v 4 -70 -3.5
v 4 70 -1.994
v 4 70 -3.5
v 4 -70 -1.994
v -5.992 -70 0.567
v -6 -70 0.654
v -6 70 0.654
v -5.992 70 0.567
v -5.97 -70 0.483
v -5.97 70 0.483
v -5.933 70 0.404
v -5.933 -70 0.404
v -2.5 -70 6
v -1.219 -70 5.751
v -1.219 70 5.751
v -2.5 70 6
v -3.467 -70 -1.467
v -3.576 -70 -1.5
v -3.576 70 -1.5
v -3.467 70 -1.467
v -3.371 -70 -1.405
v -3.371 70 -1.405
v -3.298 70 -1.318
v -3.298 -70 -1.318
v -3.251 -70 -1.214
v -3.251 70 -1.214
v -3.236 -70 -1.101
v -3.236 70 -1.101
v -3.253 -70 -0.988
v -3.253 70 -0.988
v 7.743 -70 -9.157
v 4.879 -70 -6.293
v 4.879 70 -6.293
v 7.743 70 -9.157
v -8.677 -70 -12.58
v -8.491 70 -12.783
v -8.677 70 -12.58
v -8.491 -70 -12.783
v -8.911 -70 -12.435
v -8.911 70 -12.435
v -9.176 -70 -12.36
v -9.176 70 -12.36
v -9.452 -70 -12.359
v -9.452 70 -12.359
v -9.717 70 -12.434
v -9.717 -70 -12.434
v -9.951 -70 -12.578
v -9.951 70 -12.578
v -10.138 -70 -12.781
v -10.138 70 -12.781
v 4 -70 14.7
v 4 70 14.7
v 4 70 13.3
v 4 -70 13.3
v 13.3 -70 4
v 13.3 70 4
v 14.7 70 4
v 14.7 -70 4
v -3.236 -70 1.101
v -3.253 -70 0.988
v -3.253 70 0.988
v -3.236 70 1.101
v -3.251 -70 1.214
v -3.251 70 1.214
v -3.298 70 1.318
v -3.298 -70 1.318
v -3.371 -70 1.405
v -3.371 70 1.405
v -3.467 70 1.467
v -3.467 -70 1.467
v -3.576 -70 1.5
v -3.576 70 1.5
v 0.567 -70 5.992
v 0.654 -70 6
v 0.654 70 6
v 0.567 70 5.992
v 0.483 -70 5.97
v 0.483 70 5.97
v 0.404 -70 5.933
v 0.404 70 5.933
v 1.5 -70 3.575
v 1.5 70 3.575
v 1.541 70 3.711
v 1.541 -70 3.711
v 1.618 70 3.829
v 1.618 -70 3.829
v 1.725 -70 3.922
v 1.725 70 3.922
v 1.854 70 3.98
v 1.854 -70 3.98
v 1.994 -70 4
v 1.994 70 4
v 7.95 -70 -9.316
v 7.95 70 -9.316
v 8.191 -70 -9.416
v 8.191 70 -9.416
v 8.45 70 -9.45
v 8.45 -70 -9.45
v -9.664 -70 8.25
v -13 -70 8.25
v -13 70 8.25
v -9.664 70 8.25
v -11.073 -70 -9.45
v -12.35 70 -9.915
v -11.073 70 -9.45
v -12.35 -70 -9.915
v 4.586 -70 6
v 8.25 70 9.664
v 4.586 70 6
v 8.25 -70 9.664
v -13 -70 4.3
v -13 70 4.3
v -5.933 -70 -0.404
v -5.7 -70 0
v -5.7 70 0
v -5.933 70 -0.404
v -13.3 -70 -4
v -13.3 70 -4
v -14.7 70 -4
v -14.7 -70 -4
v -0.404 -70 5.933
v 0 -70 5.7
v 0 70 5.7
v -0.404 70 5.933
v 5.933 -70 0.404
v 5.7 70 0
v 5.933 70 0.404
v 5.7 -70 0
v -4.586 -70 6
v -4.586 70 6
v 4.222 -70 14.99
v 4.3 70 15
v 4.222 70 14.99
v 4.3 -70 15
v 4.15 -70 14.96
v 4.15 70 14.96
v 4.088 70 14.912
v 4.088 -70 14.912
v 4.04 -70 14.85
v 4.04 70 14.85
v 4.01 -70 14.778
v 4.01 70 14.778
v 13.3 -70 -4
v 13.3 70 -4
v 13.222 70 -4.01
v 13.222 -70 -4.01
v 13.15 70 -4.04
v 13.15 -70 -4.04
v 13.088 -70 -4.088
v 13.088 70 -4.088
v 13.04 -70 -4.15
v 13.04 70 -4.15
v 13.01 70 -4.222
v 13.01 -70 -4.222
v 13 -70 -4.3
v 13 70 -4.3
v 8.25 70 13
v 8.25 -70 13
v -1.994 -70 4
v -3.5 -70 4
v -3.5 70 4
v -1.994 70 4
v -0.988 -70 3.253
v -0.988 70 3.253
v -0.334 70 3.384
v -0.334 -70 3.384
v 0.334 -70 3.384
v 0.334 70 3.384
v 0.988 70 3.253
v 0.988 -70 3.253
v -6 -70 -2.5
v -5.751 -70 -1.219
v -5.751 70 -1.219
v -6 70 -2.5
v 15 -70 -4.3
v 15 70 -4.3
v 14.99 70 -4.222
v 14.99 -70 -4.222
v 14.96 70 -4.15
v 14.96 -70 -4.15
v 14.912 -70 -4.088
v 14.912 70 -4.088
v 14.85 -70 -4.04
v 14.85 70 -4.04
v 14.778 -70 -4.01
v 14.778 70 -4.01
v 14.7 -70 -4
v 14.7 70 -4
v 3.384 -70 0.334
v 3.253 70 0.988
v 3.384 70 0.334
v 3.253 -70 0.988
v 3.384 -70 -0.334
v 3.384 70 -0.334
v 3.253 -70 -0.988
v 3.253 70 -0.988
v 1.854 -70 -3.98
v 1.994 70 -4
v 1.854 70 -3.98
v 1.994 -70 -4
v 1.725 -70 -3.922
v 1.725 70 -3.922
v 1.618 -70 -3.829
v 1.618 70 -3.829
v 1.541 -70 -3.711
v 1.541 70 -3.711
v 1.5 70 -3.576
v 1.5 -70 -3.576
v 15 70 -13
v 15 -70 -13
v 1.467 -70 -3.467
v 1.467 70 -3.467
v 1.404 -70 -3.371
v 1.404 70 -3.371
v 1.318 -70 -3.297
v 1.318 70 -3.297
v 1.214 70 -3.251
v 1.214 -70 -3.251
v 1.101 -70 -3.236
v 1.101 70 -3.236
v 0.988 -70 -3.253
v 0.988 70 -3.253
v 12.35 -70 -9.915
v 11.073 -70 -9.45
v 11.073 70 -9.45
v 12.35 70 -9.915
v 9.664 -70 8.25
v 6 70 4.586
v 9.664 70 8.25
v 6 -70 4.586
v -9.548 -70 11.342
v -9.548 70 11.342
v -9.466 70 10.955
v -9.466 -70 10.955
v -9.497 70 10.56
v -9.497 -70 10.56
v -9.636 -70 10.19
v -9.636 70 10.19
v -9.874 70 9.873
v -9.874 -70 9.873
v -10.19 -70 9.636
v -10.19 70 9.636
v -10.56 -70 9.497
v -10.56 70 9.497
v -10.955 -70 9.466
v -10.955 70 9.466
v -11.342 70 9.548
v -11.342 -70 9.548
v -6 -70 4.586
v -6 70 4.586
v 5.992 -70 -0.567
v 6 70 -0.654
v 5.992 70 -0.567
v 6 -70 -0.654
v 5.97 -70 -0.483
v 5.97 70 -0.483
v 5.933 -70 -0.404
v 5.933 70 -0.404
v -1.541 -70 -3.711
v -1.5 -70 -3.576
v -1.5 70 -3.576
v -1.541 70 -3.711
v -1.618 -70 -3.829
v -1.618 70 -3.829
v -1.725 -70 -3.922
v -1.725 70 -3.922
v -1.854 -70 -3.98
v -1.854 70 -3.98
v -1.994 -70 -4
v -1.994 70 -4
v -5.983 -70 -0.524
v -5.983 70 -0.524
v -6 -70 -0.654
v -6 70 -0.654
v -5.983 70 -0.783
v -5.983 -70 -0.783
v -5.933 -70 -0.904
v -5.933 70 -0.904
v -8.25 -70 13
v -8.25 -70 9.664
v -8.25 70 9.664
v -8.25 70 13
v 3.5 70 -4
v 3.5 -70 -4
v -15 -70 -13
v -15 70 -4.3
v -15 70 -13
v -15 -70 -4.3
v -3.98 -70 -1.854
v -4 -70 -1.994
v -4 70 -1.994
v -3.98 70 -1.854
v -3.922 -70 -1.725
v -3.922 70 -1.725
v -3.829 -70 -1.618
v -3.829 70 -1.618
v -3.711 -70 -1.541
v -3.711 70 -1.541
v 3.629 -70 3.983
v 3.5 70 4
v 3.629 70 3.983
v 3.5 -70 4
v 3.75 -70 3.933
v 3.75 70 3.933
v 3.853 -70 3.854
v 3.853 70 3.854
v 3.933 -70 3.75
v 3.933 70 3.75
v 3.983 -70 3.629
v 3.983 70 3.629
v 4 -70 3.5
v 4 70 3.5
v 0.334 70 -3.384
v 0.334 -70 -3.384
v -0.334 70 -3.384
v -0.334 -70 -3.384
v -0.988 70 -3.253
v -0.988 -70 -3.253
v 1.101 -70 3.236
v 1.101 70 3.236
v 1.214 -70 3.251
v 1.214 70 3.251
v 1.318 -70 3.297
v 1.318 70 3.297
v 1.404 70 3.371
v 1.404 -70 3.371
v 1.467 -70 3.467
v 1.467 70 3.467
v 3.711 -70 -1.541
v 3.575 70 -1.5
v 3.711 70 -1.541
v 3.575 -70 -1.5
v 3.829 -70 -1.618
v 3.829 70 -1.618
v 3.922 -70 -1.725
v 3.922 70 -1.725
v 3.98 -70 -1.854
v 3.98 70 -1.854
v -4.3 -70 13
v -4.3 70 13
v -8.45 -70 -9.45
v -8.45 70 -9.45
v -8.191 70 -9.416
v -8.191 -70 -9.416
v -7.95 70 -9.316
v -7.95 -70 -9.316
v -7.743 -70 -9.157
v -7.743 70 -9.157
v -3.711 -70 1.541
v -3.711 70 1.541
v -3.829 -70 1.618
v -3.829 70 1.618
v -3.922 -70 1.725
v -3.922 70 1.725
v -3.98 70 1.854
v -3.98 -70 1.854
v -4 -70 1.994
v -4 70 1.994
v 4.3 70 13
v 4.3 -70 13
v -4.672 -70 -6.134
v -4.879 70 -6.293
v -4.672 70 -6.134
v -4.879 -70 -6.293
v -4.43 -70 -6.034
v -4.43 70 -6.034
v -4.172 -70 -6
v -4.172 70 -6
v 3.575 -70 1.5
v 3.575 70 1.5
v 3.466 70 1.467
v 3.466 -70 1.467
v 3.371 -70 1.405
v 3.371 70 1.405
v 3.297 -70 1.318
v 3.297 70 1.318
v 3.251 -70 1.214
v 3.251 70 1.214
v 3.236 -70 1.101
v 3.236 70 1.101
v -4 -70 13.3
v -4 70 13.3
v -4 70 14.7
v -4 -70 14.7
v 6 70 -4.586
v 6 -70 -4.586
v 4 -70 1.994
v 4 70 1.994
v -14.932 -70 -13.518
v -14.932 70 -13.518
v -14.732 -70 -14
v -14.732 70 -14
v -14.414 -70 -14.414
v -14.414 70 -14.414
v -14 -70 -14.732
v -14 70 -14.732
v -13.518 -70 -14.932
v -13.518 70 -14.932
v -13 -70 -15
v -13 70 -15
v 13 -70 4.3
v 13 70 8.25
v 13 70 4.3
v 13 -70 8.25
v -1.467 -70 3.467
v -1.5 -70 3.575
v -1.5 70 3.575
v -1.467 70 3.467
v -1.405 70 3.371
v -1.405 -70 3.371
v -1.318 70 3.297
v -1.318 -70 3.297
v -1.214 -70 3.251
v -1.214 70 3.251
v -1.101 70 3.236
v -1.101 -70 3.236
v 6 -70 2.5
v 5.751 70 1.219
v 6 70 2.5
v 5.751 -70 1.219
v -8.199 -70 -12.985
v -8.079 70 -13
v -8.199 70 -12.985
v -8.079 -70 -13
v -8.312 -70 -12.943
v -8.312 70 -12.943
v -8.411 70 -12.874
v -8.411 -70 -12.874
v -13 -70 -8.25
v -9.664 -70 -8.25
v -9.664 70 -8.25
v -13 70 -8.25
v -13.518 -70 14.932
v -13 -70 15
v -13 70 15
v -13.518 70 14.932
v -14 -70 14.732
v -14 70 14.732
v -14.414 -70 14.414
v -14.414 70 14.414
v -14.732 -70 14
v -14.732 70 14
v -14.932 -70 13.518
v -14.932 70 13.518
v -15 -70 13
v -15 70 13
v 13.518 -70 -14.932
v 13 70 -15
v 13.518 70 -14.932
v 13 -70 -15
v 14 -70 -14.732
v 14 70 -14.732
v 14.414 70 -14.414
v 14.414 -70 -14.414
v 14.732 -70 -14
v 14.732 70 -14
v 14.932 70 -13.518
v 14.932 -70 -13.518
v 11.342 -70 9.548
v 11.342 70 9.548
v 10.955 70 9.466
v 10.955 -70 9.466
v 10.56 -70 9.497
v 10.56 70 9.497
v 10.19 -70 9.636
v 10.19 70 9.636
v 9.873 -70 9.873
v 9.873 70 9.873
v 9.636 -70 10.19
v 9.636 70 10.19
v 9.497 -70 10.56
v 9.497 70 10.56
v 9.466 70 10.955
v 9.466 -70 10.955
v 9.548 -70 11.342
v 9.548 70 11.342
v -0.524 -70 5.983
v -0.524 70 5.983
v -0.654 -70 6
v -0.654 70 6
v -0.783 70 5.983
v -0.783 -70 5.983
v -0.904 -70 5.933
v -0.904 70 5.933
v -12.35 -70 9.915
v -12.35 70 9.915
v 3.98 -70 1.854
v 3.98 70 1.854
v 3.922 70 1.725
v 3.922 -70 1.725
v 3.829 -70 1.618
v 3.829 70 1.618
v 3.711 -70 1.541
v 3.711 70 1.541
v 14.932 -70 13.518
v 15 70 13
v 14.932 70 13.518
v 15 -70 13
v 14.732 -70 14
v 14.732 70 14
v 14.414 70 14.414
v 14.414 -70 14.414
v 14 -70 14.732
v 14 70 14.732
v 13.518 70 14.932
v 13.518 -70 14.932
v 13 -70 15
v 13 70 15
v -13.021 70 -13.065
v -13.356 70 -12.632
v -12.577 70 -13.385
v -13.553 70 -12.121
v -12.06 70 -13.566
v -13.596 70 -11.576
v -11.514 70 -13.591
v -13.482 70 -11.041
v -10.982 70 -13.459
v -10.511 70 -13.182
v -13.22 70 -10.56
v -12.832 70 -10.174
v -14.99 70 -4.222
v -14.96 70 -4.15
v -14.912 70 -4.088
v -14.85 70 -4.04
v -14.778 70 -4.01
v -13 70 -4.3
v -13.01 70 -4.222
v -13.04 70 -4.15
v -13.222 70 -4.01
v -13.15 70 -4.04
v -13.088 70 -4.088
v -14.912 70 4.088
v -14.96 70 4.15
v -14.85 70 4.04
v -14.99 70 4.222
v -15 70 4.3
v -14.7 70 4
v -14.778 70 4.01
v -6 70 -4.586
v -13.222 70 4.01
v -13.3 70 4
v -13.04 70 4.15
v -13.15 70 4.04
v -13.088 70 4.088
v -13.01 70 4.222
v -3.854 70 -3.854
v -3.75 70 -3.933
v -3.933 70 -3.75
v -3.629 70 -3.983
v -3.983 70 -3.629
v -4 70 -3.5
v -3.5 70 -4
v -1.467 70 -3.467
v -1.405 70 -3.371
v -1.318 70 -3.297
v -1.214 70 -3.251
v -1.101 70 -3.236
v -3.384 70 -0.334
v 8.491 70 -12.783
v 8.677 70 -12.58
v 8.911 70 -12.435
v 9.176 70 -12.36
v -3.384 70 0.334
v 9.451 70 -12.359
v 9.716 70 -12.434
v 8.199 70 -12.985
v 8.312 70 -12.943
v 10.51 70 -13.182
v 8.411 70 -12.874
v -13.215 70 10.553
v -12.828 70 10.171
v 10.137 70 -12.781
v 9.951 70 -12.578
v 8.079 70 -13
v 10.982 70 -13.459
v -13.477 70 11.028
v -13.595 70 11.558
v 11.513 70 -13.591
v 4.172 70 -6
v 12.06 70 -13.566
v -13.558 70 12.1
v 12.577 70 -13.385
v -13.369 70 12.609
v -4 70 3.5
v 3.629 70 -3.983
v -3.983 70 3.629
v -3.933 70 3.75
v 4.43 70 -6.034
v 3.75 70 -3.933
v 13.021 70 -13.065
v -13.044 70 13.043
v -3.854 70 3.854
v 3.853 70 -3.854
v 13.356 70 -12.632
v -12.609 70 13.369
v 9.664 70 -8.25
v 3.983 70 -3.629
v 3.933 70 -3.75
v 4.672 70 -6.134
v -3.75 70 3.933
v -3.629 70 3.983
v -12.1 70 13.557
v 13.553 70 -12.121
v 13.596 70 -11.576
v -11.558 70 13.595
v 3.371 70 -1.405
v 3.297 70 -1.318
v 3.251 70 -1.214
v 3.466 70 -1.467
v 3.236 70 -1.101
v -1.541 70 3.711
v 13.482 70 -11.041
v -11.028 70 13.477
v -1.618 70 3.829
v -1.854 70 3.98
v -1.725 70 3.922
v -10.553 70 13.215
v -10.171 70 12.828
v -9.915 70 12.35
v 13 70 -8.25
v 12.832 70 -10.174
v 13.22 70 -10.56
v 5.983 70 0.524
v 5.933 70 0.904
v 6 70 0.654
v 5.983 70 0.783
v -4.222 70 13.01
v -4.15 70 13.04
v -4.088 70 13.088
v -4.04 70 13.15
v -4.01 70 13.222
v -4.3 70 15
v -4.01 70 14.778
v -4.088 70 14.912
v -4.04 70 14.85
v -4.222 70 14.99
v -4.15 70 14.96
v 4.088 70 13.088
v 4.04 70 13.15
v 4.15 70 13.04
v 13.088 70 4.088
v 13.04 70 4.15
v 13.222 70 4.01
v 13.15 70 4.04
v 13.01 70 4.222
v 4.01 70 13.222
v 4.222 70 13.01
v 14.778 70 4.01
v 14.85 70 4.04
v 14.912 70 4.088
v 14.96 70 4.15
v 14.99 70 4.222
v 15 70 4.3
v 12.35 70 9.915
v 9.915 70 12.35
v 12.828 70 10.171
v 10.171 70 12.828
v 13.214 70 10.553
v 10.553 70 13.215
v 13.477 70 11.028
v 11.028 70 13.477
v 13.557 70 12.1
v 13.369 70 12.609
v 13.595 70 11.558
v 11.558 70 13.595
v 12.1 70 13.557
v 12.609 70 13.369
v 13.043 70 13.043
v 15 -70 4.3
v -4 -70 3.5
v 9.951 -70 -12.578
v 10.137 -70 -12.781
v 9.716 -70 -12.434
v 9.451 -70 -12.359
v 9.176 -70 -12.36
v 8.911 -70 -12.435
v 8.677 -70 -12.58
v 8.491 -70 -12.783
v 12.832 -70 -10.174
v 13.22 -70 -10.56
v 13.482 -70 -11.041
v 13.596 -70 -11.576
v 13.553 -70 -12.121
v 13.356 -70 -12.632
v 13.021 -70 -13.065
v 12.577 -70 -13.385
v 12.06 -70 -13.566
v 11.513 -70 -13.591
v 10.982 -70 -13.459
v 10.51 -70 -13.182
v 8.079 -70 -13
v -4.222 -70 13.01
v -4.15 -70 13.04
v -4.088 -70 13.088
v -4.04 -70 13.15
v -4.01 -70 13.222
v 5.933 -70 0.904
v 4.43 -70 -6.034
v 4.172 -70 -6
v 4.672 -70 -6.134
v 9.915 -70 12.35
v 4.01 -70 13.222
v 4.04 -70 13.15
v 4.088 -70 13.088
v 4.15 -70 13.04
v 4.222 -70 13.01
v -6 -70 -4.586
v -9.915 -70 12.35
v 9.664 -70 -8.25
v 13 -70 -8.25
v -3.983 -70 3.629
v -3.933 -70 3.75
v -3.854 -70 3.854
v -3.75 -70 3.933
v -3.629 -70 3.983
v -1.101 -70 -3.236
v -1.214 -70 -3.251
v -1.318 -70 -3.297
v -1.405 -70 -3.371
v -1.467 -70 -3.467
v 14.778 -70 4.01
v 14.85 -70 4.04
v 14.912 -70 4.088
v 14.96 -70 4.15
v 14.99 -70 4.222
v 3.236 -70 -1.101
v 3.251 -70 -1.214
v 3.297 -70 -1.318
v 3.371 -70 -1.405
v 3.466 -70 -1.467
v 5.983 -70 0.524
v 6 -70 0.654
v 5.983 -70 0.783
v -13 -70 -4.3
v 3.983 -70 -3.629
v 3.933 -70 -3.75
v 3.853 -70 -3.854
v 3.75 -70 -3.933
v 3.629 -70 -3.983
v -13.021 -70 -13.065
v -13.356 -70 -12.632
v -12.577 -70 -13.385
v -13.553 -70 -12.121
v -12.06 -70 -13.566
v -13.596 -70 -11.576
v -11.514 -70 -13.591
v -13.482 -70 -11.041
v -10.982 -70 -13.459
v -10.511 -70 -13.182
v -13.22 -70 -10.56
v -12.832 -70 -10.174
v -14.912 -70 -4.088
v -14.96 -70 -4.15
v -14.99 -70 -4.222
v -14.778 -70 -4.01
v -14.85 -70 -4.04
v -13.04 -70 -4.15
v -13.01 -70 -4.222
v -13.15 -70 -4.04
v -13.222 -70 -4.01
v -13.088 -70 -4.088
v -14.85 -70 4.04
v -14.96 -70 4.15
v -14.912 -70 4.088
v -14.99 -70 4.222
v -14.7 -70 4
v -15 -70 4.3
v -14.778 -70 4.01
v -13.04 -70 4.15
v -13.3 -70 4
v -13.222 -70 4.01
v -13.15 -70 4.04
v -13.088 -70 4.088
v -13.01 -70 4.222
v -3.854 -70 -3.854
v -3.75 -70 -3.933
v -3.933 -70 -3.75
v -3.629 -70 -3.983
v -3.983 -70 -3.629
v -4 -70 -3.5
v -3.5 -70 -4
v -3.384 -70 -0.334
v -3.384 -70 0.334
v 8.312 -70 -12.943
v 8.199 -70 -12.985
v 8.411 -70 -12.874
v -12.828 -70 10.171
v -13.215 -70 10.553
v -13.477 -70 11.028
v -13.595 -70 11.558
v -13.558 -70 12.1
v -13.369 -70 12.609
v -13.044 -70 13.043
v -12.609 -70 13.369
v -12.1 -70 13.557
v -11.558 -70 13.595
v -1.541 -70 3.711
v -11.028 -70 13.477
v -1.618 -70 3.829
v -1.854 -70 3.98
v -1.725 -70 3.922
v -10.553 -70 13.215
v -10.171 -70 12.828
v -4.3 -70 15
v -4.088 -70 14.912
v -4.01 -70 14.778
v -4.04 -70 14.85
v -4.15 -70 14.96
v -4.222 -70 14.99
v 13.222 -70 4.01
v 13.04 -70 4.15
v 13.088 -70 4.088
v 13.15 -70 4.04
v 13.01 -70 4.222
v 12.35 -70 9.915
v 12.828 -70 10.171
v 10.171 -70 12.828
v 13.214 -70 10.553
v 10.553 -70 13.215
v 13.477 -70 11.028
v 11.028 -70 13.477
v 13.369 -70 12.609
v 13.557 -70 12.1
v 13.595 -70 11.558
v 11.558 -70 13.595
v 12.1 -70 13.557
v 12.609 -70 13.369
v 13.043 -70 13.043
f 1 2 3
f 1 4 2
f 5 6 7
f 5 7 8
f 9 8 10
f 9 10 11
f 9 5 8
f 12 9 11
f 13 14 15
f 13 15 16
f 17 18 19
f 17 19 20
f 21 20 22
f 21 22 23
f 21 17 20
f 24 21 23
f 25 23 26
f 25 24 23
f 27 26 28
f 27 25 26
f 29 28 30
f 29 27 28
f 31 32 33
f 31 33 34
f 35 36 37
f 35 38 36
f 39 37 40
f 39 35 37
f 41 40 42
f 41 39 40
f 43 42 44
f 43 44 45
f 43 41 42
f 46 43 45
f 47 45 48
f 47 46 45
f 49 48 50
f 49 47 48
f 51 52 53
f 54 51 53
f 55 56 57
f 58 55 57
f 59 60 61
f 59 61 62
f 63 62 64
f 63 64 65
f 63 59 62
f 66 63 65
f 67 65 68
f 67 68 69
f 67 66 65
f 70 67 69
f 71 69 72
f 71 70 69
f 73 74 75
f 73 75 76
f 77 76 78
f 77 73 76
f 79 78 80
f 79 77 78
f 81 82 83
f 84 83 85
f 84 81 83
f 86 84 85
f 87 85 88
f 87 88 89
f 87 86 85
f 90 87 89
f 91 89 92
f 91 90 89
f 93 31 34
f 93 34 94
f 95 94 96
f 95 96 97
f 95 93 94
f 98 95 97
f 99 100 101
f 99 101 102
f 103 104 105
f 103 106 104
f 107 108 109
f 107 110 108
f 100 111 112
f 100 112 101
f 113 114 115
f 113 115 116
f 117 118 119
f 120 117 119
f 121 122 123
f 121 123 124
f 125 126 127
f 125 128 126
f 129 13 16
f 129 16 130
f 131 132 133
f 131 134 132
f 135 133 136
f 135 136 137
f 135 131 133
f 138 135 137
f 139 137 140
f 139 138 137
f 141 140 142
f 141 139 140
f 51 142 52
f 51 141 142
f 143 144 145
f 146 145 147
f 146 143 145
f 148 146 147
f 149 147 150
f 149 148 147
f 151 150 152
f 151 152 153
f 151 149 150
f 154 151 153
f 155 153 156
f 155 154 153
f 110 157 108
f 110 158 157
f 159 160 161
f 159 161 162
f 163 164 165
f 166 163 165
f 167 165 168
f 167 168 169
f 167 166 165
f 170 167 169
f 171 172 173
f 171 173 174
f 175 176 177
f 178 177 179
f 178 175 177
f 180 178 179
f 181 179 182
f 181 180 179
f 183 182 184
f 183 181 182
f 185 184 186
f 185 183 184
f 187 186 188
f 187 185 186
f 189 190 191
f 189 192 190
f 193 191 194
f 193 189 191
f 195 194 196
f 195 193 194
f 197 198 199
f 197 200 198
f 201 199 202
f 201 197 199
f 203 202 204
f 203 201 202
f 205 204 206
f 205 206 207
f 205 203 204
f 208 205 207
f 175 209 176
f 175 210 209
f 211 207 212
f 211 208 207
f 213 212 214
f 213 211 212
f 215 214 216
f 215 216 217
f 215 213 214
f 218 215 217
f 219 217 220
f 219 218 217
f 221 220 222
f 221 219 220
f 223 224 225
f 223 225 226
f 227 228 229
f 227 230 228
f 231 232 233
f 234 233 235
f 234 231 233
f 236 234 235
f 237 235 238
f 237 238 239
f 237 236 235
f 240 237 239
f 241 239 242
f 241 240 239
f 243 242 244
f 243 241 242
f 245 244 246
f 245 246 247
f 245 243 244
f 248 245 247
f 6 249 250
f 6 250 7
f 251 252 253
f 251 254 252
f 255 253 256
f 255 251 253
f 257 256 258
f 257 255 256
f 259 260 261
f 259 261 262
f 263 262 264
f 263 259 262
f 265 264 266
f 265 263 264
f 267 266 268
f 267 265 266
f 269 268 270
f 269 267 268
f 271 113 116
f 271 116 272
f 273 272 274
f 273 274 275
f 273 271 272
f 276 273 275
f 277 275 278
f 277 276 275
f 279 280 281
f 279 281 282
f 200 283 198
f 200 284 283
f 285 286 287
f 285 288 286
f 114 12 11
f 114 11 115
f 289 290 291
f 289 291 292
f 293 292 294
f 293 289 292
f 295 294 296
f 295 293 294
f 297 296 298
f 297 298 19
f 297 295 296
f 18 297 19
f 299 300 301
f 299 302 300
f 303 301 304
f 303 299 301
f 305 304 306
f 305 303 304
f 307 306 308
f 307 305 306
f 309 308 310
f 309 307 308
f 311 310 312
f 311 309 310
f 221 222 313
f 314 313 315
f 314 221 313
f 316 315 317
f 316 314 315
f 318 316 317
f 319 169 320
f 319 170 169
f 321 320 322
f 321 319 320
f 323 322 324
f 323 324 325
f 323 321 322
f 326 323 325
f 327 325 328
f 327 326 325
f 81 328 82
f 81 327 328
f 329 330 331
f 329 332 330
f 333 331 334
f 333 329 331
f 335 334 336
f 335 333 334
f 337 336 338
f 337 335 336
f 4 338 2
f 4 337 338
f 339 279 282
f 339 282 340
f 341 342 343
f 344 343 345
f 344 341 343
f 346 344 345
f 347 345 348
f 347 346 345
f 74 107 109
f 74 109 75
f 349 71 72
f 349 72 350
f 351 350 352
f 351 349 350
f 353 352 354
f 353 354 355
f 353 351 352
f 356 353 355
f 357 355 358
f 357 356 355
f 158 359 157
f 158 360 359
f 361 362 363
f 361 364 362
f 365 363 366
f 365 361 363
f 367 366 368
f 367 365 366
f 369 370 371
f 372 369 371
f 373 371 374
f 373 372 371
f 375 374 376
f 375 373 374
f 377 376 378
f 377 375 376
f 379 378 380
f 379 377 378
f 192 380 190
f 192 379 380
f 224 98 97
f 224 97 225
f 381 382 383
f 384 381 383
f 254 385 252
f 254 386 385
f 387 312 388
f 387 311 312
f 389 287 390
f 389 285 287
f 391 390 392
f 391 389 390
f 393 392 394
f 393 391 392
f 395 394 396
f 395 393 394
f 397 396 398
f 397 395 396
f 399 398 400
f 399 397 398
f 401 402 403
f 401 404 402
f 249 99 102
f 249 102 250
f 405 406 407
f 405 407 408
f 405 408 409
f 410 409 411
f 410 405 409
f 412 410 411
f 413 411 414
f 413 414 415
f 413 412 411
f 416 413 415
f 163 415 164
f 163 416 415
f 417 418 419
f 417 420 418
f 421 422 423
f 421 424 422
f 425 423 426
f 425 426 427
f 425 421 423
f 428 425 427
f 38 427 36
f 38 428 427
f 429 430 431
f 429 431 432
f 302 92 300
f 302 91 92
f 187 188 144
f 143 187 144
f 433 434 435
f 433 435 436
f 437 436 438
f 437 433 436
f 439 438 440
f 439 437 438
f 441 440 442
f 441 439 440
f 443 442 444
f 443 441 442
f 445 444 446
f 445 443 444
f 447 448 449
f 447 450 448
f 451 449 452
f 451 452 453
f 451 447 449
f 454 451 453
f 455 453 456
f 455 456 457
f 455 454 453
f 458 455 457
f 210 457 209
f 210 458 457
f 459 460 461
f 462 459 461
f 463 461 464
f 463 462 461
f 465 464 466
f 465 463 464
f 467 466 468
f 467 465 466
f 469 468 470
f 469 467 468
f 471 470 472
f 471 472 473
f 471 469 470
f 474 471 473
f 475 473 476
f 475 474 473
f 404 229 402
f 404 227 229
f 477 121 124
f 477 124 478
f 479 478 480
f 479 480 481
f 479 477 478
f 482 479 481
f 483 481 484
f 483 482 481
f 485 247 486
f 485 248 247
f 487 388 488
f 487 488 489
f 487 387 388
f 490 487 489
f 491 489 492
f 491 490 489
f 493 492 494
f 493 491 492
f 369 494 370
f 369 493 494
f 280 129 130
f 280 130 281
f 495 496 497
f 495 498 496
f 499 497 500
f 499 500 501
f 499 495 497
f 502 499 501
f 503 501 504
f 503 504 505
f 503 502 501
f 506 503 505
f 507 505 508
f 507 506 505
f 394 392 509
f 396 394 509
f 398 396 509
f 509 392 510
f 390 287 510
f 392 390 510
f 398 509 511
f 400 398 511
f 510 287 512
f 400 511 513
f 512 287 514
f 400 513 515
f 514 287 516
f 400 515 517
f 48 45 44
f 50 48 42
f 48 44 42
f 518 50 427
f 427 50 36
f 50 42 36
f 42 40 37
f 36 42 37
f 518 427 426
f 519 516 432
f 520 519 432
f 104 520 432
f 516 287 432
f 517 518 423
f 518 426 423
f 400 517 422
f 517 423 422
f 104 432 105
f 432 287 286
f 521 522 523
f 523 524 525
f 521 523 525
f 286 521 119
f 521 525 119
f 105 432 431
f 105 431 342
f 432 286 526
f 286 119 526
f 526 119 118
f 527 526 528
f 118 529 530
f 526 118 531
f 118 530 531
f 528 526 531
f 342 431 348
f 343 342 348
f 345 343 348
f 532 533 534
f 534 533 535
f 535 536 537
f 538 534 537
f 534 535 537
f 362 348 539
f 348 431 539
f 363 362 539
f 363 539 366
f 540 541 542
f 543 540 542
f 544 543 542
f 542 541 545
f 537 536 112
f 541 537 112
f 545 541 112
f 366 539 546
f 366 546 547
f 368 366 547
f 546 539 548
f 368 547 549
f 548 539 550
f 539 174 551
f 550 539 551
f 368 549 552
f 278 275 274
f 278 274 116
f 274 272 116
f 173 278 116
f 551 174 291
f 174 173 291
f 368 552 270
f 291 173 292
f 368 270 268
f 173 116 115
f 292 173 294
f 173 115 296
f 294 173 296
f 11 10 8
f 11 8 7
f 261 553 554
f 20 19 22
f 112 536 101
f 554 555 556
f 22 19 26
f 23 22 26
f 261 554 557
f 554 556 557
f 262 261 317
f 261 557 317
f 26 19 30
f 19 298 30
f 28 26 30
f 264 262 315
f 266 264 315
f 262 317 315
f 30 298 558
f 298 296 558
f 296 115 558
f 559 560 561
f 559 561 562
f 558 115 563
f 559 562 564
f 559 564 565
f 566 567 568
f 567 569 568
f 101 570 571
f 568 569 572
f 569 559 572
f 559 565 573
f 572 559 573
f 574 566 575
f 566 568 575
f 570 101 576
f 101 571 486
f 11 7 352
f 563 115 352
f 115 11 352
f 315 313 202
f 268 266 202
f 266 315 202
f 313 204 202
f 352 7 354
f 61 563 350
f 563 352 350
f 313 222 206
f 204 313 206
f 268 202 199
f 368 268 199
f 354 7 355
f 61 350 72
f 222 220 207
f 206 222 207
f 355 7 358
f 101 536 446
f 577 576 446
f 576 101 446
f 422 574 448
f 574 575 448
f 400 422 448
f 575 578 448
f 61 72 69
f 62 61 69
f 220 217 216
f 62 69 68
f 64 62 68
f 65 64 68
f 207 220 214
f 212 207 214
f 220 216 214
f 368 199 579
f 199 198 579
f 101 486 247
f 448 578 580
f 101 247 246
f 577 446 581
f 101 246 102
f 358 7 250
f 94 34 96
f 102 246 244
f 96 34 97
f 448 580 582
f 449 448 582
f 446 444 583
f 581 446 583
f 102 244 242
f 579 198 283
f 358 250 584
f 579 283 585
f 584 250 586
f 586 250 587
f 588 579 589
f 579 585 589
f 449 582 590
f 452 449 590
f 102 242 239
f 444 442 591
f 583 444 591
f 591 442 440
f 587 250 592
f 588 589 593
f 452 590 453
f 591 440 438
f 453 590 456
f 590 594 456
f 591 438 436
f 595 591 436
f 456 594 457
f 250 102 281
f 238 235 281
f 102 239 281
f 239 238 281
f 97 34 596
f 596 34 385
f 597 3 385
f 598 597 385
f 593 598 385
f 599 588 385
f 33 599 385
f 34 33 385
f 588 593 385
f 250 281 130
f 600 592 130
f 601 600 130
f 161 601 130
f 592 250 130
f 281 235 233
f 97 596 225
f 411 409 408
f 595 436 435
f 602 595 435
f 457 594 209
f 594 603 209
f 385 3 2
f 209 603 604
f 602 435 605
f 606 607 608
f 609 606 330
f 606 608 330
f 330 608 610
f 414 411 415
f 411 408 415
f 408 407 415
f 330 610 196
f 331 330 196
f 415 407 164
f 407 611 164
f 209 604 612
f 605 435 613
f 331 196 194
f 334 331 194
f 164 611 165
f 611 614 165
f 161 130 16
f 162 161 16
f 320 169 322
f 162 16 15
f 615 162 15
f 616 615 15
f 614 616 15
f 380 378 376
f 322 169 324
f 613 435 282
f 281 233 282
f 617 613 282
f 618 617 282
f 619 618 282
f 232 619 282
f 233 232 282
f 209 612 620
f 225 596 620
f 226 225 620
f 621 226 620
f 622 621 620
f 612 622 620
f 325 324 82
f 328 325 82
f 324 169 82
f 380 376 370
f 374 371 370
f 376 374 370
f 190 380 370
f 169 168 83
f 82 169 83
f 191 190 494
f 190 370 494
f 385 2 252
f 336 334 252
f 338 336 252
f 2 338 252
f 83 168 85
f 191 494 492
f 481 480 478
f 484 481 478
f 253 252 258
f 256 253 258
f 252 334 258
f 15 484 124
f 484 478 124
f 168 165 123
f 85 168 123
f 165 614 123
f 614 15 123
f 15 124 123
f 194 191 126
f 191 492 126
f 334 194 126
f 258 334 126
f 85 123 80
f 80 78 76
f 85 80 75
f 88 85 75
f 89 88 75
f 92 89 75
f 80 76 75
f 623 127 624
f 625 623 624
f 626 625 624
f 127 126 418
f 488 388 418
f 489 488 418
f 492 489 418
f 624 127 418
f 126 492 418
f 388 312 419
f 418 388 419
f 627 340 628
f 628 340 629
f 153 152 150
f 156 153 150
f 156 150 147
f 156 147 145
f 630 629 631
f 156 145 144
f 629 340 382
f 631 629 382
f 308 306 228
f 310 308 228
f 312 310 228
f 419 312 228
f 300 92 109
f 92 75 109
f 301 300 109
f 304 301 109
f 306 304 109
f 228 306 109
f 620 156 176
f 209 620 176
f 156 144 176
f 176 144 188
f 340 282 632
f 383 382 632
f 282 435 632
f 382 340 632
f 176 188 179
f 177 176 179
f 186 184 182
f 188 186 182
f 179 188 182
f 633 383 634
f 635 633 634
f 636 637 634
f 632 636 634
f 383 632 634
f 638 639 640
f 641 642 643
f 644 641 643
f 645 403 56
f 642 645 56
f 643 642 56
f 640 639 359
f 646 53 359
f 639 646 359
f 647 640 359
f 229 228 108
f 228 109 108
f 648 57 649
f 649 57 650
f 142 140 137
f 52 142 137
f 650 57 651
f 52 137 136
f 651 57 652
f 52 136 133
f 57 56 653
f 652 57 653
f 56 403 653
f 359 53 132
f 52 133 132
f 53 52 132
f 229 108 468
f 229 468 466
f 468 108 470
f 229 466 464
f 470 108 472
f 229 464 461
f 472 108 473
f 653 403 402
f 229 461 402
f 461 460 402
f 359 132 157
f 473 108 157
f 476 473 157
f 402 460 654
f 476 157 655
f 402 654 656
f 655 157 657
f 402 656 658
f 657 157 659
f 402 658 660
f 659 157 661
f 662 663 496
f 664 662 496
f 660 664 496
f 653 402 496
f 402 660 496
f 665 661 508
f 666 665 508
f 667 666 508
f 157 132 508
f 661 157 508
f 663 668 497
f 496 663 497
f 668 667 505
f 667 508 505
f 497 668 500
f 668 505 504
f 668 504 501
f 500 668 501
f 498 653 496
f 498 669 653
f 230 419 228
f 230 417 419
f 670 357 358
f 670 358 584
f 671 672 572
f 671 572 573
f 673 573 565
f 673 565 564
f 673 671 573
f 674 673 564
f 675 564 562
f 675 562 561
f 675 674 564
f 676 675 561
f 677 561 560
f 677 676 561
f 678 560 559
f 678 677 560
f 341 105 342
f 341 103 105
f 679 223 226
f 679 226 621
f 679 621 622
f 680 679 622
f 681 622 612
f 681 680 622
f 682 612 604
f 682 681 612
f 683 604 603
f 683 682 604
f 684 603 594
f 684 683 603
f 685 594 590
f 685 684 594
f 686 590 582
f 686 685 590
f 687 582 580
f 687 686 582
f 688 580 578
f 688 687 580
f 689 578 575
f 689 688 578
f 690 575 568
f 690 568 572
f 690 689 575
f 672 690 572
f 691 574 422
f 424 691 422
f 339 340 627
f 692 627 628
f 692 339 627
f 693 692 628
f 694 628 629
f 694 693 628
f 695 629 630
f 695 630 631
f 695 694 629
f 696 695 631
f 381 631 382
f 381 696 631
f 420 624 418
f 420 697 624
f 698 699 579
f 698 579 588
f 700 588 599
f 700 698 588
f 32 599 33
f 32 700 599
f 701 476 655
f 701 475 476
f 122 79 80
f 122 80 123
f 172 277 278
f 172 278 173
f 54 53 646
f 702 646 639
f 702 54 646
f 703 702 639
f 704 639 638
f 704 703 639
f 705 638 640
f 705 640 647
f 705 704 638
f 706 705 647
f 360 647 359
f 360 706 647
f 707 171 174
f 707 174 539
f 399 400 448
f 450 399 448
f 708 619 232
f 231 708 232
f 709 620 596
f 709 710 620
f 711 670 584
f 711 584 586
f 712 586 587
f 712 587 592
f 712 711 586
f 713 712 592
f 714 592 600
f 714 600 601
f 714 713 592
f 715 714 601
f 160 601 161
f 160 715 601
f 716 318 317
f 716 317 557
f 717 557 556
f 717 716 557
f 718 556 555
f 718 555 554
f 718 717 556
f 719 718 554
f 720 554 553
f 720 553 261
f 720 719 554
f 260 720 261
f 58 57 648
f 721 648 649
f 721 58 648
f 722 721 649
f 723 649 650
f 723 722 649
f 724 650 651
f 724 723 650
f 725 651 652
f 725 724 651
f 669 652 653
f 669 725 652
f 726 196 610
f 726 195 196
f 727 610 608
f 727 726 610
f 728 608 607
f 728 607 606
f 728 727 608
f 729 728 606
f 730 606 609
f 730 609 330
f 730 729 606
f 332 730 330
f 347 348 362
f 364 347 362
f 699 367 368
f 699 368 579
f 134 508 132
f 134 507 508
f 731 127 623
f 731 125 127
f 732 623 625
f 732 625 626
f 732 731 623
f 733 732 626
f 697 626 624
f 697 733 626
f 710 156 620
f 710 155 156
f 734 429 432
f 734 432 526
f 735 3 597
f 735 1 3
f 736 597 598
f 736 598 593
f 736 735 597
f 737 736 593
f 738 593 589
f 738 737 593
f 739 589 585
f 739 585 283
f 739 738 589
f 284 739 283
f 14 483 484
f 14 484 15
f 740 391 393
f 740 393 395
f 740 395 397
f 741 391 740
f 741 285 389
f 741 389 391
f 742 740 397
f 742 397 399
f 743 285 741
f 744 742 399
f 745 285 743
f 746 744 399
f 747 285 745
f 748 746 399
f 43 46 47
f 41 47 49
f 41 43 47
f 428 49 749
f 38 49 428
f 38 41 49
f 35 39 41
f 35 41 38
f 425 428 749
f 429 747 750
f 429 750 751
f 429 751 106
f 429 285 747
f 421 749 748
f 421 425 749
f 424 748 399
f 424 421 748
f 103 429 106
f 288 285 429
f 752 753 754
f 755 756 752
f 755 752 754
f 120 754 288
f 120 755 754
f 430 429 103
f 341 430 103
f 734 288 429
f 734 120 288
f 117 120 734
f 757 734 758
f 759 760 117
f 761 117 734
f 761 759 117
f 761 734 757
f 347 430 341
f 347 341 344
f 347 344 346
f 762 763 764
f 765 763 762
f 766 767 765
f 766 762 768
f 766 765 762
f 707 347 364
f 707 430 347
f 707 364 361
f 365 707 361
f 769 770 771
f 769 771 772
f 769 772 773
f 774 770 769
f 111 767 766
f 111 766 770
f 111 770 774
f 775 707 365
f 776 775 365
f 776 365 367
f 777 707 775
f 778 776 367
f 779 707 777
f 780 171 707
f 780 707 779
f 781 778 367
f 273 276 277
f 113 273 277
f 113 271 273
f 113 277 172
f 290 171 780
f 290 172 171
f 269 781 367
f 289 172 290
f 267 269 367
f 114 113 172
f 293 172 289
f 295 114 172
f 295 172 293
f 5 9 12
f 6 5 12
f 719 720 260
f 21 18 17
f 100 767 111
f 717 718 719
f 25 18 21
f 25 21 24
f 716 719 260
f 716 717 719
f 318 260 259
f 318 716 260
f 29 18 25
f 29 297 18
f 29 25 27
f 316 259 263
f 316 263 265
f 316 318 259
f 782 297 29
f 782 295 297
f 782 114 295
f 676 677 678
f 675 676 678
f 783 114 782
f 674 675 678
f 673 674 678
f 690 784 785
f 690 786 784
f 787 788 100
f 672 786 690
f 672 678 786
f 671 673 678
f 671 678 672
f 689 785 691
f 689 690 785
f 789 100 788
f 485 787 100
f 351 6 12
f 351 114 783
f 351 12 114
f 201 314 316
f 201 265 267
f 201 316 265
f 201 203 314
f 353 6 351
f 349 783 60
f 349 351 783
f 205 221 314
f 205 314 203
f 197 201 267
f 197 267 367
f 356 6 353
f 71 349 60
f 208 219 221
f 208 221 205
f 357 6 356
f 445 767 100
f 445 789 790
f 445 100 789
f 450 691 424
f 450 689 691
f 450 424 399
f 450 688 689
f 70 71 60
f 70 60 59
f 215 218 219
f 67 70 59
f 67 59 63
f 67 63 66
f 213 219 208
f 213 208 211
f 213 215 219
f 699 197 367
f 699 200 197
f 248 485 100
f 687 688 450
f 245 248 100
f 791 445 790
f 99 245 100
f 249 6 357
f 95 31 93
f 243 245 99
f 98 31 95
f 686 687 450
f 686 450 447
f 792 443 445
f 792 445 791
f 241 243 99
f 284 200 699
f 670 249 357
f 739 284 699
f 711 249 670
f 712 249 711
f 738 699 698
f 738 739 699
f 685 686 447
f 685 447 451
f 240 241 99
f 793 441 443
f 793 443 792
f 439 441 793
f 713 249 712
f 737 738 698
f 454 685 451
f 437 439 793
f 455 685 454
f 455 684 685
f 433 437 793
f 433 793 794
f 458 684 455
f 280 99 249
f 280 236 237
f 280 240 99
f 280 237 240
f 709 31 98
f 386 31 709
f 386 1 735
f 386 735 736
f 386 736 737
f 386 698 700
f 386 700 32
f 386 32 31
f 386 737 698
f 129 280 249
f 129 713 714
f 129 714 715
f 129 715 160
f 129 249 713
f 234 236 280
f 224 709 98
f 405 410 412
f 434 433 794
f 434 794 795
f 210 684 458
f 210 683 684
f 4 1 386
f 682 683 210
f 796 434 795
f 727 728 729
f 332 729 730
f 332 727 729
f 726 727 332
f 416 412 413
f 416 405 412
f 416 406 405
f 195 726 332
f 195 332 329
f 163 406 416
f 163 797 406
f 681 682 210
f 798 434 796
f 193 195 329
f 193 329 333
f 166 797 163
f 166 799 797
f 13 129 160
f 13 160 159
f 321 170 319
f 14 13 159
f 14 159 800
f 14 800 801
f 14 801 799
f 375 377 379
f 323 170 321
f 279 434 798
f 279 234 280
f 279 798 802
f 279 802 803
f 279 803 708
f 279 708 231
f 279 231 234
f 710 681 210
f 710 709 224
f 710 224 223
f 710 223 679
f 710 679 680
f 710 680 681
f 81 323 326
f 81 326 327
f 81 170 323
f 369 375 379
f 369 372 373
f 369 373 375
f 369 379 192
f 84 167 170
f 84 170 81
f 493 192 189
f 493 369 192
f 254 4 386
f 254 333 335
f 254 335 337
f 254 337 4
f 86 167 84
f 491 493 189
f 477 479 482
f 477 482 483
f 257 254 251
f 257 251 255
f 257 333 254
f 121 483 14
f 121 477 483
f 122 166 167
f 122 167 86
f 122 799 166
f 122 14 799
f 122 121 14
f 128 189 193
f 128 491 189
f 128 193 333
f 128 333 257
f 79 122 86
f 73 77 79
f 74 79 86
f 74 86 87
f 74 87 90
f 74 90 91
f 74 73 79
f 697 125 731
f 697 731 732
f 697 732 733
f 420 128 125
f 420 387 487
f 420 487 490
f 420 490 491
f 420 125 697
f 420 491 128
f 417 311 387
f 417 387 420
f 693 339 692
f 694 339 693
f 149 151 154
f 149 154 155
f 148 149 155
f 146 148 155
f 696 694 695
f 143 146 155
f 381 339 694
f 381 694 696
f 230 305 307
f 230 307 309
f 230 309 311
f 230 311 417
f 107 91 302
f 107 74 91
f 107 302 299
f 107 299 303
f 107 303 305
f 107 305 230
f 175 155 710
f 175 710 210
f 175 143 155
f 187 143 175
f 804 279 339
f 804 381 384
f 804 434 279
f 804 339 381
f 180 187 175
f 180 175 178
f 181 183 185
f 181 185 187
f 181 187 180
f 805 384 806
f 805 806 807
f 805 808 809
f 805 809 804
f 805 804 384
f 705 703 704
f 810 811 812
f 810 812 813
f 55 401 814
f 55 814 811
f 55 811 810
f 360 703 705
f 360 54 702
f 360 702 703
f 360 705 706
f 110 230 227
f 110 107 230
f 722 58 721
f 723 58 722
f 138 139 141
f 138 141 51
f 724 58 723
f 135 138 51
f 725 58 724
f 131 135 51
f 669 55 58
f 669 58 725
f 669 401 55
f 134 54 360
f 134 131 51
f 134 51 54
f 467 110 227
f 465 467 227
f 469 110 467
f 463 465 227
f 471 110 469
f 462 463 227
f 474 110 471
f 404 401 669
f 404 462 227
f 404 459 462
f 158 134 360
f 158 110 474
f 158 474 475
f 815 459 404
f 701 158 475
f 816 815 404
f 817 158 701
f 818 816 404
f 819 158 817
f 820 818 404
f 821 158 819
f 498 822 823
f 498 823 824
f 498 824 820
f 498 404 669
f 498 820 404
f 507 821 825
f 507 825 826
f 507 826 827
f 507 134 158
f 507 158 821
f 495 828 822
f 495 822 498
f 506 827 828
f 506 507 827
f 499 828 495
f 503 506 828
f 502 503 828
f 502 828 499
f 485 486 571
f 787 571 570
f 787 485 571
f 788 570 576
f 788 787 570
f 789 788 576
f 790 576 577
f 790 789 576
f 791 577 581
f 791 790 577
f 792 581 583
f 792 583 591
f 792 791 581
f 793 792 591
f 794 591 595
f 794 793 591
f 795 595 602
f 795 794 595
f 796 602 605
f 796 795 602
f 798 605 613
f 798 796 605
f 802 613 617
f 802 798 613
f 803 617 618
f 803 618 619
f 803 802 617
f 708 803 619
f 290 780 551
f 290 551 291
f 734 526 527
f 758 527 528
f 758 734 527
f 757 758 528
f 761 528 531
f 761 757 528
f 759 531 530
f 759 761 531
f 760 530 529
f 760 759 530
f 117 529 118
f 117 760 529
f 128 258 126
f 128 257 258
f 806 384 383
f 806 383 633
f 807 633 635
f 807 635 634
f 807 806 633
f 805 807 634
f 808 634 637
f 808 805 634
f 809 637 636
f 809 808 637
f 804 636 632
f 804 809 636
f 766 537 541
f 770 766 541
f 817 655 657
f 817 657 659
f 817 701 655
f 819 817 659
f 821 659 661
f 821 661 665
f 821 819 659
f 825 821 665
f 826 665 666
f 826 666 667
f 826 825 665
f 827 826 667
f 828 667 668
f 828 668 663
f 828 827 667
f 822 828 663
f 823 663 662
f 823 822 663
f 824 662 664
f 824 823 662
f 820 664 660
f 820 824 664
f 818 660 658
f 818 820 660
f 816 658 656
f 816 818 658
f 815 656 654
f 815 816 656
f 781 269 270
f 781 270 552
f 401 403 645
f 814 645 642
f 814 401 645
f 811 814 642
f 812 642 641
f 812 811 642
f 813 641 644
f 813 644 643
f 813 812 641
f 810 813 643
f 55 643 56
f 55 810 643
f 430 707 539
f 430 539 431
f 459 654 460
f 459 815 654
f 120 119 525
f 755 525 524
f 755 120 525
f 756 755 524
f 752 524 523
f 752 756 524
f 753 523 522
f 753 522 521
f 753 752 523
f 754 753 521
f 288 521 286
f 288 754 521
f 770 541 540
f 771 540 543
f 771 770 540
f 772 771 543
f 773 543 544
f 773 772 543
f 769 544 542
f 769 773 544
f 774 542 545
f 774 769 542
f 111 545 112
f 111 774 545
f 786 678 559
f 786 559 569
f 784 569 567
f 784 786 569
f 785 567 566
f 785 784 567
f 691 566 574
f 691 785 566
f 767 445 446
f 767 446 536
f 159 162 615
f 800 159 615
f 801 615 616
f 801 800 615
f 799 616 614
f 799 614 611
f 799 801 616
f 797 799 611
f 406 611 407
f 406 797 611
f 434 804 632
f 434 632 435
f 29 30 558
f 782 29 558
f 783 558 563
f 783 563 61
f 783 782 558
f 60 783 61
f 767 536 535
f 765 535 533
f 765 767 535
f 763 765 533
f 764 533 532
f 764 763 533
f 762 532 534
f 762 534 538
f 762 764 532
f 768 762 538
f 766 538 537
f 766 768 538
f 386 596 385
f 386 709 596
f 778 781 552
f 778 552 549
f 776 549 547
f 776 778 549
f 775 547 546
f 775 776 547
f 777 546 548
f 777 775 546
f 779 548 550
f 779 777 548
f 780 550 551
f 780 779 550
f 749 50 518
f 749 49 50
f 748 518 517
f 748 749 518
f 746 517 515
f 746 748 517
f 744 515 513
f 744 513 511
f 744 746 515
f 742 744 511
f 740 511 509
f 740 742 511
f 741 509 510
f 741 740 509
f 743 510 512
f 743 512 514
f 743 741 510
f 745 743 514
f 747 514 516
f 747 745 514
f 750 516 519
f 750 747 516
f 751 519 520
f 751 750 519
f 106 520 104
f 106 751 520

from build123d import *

# Parameters (mm, degrees)
F2_DEPTH = 70


# Not quite as in the source:
# - ends of sketch curves that miss each other by under 0.0002 mm in the source are joined


with BuildPart() as f2:
    # F1 (on Front) → F2 (new body, symmetric)
    with BuildSketch(Plane.XZ):
        with BuildLine():
            Line((8.249944, 9.6642), (4.58573, 5.999986))
            Line((4.58573, 5.999986), (0.653534, 5.999986))
            ThreePointArc((0.653534, 5.999986), (0.5241245494, 5.9829489324), (0.4035341291, 5.9329987764))
            Line((0.4035341291, 5.9329987764), (-5.6e-05, 5.699986))
            Line((-5.6e-05, 5.699986), (-0.403646, 5.932999))
            ThreePointArc((-0.403646, 5.932999), (-0.653646, 5.999986), (-0.9036458709, 5.9329987764))
            Line((-0.9036458709, 5.9329987764), (-1.218942, 5.750963))
            Line((-1.218942, 5.750963), (-2.500056, 5.999986))
            Line((-2.500056, 5.999986), (-4.585842, 5.999986))
            Line((-4.585842, 5.999986), (-8.250056, 9.6642))
            Line((-8.250056, 9.6642), (-8.250056, 12.999986))
            Line((-8.250056, 12.999986), (-4.300056, 12.999986))
            ThreePointArc((-4.300056, 12.999986), (-4.0879239656, 13.0878539656), (-4.000056, 13.299986))
            Line((-4.000056, 13.299986), (-4.000056, 14.699986))
            ThreePointArc((-4.000056, 14.699986), (-4.0879239656, 14.9121180344), (-4.300056, 14.999986))
            Line((-4.300056, 14.999986), (-13.000056, 14.999986))
            ThreePointArc((-13.000056, 14.999986), (-14.4142695624, 14.4141995624), (-15.000056, 12.999986))
            Line((-15.000056, 12.999986), (-15.000056, 4.299986))
            ThreePointArc((-15.000056, 4.299986), (-14.9121880344, 4.0878539656), (-14.700056, 3.999986))
            Line((-14.700056, 3.999986), (-13.300056, 3.999986))
            ThreePointArc((-13.300056, 3.999986), (-13.0879239656, 4.0878539656), (-13.000056, 4.299986))
            Line((-13.000056, 4.299986), (-13.000056, 8.249986))
            Line((-13.000056, 8.249986), (-9.66427, 8.249986))
            Line((-9.66427, 8.249986), (-6.000056, 4.585772))
            Line((-6.000056, 4.585772), (-6.000056, 0.653576))
            ThreePointArc((-6.000056, 0.653576), (-5.9830189324, 0.5241665494), (-5.9330687764, 0.4035761291))
            Line((-5.9330687764, 0.4035761291), (-5.700056, -1.4e-05))
            Line((-5.700056, -1.4e-05), (-5.933069, -0.403604))
            ThreePointArc((-5.933069, -0.403604), (-6.000056, -0.653604), (-5.9330687764, -0.9036038709))
            Line((-5.9330687764, -0.9036038709), (-5.751033, -1.2189))
            Line((-5.751033, -1.2189), (-6.000056, -2.500014))
            Line((-6.000056, -2.500014), (-6.000056, -4.5858))
            Line((-6.000056, -4.5858), (-9.66427, -8.250014))
            Line((-9.66427, -8.250014), (-13.000056, -8.250014))
            Line((-13.000056, -8.250014), (-13.000056, -4.300014))
            ThreePointArc((-13.000056, -4.300014), (-13.0879239656, -4.0878819656), (-13.300056, -4.000014))
            Line((-13.300056, -4.000014), (-14.700056, -4.000014))
            ThreePointArc((-14.700056, -4.000014), (-14.9121880344, -4.0878819656), (-15.000056, -4.300014))
            Line((-15.000056, -4.300014), (-15.000056, -13.000014))
            ThreePointArc((-15.000056, -13.000014), (-14.4142695624, -14.4142275624), (-13.000056, -15.000014))
            Line((-13.000056, -15.000014), (12.999944, -15.000014))
            ThreePointArc((12.999944, -15.000014), (14.4141575624, -14.4142275624), (14.999944, -13.000014))
            Line((14.999944, -13.000014), (14.999944, -4.300014))
            ThreePointArc((14.999944, -4.300014), (14.9120760344, -4.0878819656), (14.699944, -4.000014))
            Line((14.699944, -4.000014), (13.299944, -4.000014))
            ThreePointArc((13.299944, -4.000014), (13.0878119656, -4.0878819656), (12.999944, -4.300014))
            Line((12.999944, -4.300014), (12.999944, -8.250014))
            Line((12.999944, -8.250014), (9.664158, -8.250014))
            Line((9.664158, -8.250014), (5.999944, -4.5858))
            Line((5.999944, -4.5858), (5.999944, -0.653604))
            ThreePointArc((5.999944, -0.653604), (5.9829069324, -0.5241945494), (5.9329567764, -0.4036041291))
            Line((5.9329567764, -0.4036041291), (5.699944, -1.4e-05))
            Line((5.699944, -1.4e-05), (5.932957, 0.403576))
            ThreePointArc((5.932957, 0.403576), (5.999944, 0.653576), (5.9329567764, 0.9035758709))
            Line((5.9329567764, 0.9035758709), (5.750921, 1.218872))
            Line((5.750921, 1.218872), (5.999944, 2.499986))
            Line((5.999944, 2.499986), (5.999944, 4.585772))
            Line((5.999944, 4.585772), (9.664158, 8.249986))
            Line((9.664158, 8.249986), (12.999944, 8.249986))
            Line((12.999944, 8.249986), (12.999944, 4.299986))
            ThreePointArc((12.999944, 4.299986), (13.0878119656, 4.0878539656), (13.299944, 3.999986))
            Line((13.299944, 3.999986), (14.699944, 3.999986))
            ThreePointArc((14.699944, 3.999986), (14.9120760344, 4.0878539656), (14.999944, 4.299986))
            Line((14.999944, 4.299986), (14.999944, 12.999986))
            ThreePointArc((14.999944, 12.999986), (14.4141575624, 14.4141995624), (12.999944, 14.999986))
            Line((12.999944, 14.999986), (4.299944, 14.999986))
            ThreePointArc((4.299944, 14.999986), (4.0878119656, 14.9121180344), (3.999944, 14.699986))
            Line((3.999944, 14.699986), (3.999944, 13.299986))
            ThreePointArc((3.999944, 13.299986), (4.0878119656, 13.0878539656), (4.299944, 12.999986))
            Line((4.299944, 12.999986), (8.249944, 12.999986))
            Line((8.249944, 12.999986), (8.249944, 9.6642))
        make_face()
        with BuildLine():
            Line((-4.171629, -6.000014), (4.171517, -6.000014))
            ThreePointArc((4.171517, -6.000014), (4.5542004324, -6.0761344675), (4.8786237812, -6.2929072188))
            Line((4.8786237812, -6.2929072188), (7.742837, -9.157121))
            ThreePointArc((7.742837, -9.157121), (8.0672605676, -9.3738935325), (8.449944, -9.450014))
            Line((8.449944, -9.450014), (11.073348, -9.450014))
            Line((11.073348, -9.450014), (12.349782, -9.914598))
            ThreePointArc((12.349782, -9.914598), (13.2040603505, -12.8608903949), (10.1374570291, -12.7810479799))
            ThreePointArc((10.1374570291, -12.7810479799), (9.3136995047, -12.3500149751), (8.4911490608, -12.7833470418))
            ThreePointArc((8.4911490608, -12.7833470418), (8.3119125635, -12.9425444809), (8.079175, -13.000014))
            Line((8.079175, -13.000014), (-8.079287, -13.000014))
            ThreePointArc((-8.079287, -13.000014), (-8.3120245635, -12.9425444809), (-8.4912608636, -12.7833469062))
            ThreePointArc((-8.4912608636, -12.7833469062), (-9.3138115047, -12.3500149751), (-10.1375690315, -12.7810479782))
            ThreePointArc((-10.1375690315, -12.7810479782), (-13.2041723505, -12.8608903949), (-12.3498940253, -9.9145979306))
            Line((-12.3498940253, -9.9145979306), (-11.07346, -9.450014))
            Line((-11.07346, -9.450014), (-8.450056, -9.450014))
            ThreePointArc((-8.450056, -9.450014), (-8.0673725676, -9.3738935325), (-7.7429492188, -9.1571207812))
            Line((-7.7429492188, -9.1571207812), (-4.878736, -6.292907))
            ThreePointArc((-4.878736, -6.292907), (-4.5543124324, -6.0761344675), (-4.171629, -6.000014))
        make_face(mode=Mode.SUBTRACT)
        with BuildLine():
            ThreePointArc((-12.3498940253, 9.9145699306), (-13.0435588843, 13.0434888843), (-9.9146399306, 12.3498240253))
            Line((-9.9146399306, 12.3498240253), (-9.547908, 11.342236))
            ThreePointArc((-9.547908, 11.342236), (-9.8735275063, 9.8734575063), (-11.3423061215, 9.5478376661))
            Line((-11.3423061215, 9.5478376661), (-12.3498940253, 9.9145699306))
        make_face(mode=Mode.SUBTRACT)
        with BuildLine():
            ThreePointArc((0.9882629956, -3.2532009855), (-5.6e-05, -3.400014), (-0.9883749956, -3.2532009855))
            ThreePointArc((-0.9883749956, -3.2532009855), (-1.3178396431, -3.2974811593), (-1.5000564258, -3.5755229349))
            ThreePointArc((-1.5000564258, -3.5755229349), (-1.6685571025, -3.8793255231), (-1.994322, -4.000014))
            Line((-1.994322, -4.000014), (-3.500056, -4.000014))
            ThreePointArc((-3.500056, -4.000014), (-3.8536093906, -3.8535673906), (-4.000056, -3.500014))
            Line((-4.000056, -3.500014), (-4.000056, -1.99428))
            ThreePointArc((-4.000056, -1.99428), (-3.8793675231, -1.6685151025), (-3.5755649263, -1.5000144822))
            ThreePointArc((-3.5755649263, -1.5000144822), (-3.2975231593, -1.3177976431), (-3.2532441585, -0.9883290481))
            ThreePointArc((-3.2532441585, -0.9883290481), (-3.400056, -1.4e-05), (-3.2532429855, 0.9883049956))
            ThreePointArc((-3.2532429855, 0.9883049956), (-3.2975231593, 1.3177696431), (-3.5755649349, 1.4999864258))
            ThreePointArc((-3.5755649349, 1.4999864258), (-3.8793675231, 1.6684871025), (-4.000056, 1.994252))
            Line((-4.000056, 1.994252), (-4.000056, 3.499986))
            ThreePointArc((-4.000056, 3.499986), (-3.8536093906, 3.8535393906), (-3.500056, 3.999986))
            Line((-3.500056, 3.999986), (-1.994322, 3.999986))
            ThreePointArc((-1.994322, 3.999986), (-1.6685571025, 3.8792975231), (-1.5000564822, 3.5754949263))
            ThreePointArc((-1.5000564822, 3.5754949263), (-1.3178396431, 3.2974531593), (-0.9883710481, 3.2531741585))
            ThreePointArc((-0.9883710481, 3.2531741585), (-5.6e-05, 3.399986), (0.9882629956, 3.2531729855))
            ThreePointArc((0.9882629956, 3.2531729855), (1.3177276431, 3.2974531593), (1.4999444258, 3.5754949349))
            ThreePointArc((1.4999444258, 3.5754949349), (1.6684451025, 3.8792975231), (1.99421, 3.999986))
            Line((1.99421, 3.999986), (3.499944, 3.999986))
            ThreePointArc((3.499944, 3.999986), (3.8534973906, 3.8535393906), (3.999944, 3.499986))
            Line((3.999944, 3.499986), (3.999944, 1.994252))
            ThreePointArc((3.999944, 1.994252), (3.8792555231, 1.6684871025), (3.5754529263, 1.4999864822))
            ThreePointArc((3.5754529263, 1.4999864822), (3.2974111593, 1.3177696431), (3.2531321585, 0.9883010481))
            ThreePointArc((3.2531321585, 0.9883010481), (3.399944, -1.4e-05), (3.2531309855, -0.9883329956))
            ThreePointArc((3.2531309855, -0.9883329956), (3.2974111593, -1.3177976431), (3.5754529349, -1.5000144258))
            ThreePointArc((3.5754529349, -1.5000144258), (3.8792555231, -1.6685151025), (3.999944, -1.99428))
            Line((3.999944, -1.99428), (3.999944, -3.500014))
            ThreePointArc((3.999944, -3.500014), (3.8534973906, -3.8535673906), (3.499944, -4.000014))
            Line((3.499944, -4.000014), (1.99421, -4.000014))
            ThreePointArc((1.99421, -4.000014), (1.6684451025, -3.8793255231), (1.4999444822, -3.5755229263))
            ThreePointArc((1.4999444822, -3.5755229263), (1.3177276431, -3.2974811593), (0.9882629956, -3.2532009855))
        make_face(mode=Mode.SUBTRACT)
        with BuildLine():
            ThreePointArc((11.3421941215, 9.5478376661), (9.8734155063, 9.8734575063), (9.5477956661, 11.3422361215))
            Line((9.5477956661, 11.3422361215), (9.914528, 12.349824))
            ThreePointArc((9.914528, 12.349824), (13.0434468843, 13.0434888843), (12.3497820253, 9.9145699306))
            Line((12.3497820253, 9.9145699306), (11.3421941215, 9.5478376661))
        make_face(mode=Mode.SUBTRACT)
    extrude(amount=F2_DEPTH, both=True)


solid = f2.part
